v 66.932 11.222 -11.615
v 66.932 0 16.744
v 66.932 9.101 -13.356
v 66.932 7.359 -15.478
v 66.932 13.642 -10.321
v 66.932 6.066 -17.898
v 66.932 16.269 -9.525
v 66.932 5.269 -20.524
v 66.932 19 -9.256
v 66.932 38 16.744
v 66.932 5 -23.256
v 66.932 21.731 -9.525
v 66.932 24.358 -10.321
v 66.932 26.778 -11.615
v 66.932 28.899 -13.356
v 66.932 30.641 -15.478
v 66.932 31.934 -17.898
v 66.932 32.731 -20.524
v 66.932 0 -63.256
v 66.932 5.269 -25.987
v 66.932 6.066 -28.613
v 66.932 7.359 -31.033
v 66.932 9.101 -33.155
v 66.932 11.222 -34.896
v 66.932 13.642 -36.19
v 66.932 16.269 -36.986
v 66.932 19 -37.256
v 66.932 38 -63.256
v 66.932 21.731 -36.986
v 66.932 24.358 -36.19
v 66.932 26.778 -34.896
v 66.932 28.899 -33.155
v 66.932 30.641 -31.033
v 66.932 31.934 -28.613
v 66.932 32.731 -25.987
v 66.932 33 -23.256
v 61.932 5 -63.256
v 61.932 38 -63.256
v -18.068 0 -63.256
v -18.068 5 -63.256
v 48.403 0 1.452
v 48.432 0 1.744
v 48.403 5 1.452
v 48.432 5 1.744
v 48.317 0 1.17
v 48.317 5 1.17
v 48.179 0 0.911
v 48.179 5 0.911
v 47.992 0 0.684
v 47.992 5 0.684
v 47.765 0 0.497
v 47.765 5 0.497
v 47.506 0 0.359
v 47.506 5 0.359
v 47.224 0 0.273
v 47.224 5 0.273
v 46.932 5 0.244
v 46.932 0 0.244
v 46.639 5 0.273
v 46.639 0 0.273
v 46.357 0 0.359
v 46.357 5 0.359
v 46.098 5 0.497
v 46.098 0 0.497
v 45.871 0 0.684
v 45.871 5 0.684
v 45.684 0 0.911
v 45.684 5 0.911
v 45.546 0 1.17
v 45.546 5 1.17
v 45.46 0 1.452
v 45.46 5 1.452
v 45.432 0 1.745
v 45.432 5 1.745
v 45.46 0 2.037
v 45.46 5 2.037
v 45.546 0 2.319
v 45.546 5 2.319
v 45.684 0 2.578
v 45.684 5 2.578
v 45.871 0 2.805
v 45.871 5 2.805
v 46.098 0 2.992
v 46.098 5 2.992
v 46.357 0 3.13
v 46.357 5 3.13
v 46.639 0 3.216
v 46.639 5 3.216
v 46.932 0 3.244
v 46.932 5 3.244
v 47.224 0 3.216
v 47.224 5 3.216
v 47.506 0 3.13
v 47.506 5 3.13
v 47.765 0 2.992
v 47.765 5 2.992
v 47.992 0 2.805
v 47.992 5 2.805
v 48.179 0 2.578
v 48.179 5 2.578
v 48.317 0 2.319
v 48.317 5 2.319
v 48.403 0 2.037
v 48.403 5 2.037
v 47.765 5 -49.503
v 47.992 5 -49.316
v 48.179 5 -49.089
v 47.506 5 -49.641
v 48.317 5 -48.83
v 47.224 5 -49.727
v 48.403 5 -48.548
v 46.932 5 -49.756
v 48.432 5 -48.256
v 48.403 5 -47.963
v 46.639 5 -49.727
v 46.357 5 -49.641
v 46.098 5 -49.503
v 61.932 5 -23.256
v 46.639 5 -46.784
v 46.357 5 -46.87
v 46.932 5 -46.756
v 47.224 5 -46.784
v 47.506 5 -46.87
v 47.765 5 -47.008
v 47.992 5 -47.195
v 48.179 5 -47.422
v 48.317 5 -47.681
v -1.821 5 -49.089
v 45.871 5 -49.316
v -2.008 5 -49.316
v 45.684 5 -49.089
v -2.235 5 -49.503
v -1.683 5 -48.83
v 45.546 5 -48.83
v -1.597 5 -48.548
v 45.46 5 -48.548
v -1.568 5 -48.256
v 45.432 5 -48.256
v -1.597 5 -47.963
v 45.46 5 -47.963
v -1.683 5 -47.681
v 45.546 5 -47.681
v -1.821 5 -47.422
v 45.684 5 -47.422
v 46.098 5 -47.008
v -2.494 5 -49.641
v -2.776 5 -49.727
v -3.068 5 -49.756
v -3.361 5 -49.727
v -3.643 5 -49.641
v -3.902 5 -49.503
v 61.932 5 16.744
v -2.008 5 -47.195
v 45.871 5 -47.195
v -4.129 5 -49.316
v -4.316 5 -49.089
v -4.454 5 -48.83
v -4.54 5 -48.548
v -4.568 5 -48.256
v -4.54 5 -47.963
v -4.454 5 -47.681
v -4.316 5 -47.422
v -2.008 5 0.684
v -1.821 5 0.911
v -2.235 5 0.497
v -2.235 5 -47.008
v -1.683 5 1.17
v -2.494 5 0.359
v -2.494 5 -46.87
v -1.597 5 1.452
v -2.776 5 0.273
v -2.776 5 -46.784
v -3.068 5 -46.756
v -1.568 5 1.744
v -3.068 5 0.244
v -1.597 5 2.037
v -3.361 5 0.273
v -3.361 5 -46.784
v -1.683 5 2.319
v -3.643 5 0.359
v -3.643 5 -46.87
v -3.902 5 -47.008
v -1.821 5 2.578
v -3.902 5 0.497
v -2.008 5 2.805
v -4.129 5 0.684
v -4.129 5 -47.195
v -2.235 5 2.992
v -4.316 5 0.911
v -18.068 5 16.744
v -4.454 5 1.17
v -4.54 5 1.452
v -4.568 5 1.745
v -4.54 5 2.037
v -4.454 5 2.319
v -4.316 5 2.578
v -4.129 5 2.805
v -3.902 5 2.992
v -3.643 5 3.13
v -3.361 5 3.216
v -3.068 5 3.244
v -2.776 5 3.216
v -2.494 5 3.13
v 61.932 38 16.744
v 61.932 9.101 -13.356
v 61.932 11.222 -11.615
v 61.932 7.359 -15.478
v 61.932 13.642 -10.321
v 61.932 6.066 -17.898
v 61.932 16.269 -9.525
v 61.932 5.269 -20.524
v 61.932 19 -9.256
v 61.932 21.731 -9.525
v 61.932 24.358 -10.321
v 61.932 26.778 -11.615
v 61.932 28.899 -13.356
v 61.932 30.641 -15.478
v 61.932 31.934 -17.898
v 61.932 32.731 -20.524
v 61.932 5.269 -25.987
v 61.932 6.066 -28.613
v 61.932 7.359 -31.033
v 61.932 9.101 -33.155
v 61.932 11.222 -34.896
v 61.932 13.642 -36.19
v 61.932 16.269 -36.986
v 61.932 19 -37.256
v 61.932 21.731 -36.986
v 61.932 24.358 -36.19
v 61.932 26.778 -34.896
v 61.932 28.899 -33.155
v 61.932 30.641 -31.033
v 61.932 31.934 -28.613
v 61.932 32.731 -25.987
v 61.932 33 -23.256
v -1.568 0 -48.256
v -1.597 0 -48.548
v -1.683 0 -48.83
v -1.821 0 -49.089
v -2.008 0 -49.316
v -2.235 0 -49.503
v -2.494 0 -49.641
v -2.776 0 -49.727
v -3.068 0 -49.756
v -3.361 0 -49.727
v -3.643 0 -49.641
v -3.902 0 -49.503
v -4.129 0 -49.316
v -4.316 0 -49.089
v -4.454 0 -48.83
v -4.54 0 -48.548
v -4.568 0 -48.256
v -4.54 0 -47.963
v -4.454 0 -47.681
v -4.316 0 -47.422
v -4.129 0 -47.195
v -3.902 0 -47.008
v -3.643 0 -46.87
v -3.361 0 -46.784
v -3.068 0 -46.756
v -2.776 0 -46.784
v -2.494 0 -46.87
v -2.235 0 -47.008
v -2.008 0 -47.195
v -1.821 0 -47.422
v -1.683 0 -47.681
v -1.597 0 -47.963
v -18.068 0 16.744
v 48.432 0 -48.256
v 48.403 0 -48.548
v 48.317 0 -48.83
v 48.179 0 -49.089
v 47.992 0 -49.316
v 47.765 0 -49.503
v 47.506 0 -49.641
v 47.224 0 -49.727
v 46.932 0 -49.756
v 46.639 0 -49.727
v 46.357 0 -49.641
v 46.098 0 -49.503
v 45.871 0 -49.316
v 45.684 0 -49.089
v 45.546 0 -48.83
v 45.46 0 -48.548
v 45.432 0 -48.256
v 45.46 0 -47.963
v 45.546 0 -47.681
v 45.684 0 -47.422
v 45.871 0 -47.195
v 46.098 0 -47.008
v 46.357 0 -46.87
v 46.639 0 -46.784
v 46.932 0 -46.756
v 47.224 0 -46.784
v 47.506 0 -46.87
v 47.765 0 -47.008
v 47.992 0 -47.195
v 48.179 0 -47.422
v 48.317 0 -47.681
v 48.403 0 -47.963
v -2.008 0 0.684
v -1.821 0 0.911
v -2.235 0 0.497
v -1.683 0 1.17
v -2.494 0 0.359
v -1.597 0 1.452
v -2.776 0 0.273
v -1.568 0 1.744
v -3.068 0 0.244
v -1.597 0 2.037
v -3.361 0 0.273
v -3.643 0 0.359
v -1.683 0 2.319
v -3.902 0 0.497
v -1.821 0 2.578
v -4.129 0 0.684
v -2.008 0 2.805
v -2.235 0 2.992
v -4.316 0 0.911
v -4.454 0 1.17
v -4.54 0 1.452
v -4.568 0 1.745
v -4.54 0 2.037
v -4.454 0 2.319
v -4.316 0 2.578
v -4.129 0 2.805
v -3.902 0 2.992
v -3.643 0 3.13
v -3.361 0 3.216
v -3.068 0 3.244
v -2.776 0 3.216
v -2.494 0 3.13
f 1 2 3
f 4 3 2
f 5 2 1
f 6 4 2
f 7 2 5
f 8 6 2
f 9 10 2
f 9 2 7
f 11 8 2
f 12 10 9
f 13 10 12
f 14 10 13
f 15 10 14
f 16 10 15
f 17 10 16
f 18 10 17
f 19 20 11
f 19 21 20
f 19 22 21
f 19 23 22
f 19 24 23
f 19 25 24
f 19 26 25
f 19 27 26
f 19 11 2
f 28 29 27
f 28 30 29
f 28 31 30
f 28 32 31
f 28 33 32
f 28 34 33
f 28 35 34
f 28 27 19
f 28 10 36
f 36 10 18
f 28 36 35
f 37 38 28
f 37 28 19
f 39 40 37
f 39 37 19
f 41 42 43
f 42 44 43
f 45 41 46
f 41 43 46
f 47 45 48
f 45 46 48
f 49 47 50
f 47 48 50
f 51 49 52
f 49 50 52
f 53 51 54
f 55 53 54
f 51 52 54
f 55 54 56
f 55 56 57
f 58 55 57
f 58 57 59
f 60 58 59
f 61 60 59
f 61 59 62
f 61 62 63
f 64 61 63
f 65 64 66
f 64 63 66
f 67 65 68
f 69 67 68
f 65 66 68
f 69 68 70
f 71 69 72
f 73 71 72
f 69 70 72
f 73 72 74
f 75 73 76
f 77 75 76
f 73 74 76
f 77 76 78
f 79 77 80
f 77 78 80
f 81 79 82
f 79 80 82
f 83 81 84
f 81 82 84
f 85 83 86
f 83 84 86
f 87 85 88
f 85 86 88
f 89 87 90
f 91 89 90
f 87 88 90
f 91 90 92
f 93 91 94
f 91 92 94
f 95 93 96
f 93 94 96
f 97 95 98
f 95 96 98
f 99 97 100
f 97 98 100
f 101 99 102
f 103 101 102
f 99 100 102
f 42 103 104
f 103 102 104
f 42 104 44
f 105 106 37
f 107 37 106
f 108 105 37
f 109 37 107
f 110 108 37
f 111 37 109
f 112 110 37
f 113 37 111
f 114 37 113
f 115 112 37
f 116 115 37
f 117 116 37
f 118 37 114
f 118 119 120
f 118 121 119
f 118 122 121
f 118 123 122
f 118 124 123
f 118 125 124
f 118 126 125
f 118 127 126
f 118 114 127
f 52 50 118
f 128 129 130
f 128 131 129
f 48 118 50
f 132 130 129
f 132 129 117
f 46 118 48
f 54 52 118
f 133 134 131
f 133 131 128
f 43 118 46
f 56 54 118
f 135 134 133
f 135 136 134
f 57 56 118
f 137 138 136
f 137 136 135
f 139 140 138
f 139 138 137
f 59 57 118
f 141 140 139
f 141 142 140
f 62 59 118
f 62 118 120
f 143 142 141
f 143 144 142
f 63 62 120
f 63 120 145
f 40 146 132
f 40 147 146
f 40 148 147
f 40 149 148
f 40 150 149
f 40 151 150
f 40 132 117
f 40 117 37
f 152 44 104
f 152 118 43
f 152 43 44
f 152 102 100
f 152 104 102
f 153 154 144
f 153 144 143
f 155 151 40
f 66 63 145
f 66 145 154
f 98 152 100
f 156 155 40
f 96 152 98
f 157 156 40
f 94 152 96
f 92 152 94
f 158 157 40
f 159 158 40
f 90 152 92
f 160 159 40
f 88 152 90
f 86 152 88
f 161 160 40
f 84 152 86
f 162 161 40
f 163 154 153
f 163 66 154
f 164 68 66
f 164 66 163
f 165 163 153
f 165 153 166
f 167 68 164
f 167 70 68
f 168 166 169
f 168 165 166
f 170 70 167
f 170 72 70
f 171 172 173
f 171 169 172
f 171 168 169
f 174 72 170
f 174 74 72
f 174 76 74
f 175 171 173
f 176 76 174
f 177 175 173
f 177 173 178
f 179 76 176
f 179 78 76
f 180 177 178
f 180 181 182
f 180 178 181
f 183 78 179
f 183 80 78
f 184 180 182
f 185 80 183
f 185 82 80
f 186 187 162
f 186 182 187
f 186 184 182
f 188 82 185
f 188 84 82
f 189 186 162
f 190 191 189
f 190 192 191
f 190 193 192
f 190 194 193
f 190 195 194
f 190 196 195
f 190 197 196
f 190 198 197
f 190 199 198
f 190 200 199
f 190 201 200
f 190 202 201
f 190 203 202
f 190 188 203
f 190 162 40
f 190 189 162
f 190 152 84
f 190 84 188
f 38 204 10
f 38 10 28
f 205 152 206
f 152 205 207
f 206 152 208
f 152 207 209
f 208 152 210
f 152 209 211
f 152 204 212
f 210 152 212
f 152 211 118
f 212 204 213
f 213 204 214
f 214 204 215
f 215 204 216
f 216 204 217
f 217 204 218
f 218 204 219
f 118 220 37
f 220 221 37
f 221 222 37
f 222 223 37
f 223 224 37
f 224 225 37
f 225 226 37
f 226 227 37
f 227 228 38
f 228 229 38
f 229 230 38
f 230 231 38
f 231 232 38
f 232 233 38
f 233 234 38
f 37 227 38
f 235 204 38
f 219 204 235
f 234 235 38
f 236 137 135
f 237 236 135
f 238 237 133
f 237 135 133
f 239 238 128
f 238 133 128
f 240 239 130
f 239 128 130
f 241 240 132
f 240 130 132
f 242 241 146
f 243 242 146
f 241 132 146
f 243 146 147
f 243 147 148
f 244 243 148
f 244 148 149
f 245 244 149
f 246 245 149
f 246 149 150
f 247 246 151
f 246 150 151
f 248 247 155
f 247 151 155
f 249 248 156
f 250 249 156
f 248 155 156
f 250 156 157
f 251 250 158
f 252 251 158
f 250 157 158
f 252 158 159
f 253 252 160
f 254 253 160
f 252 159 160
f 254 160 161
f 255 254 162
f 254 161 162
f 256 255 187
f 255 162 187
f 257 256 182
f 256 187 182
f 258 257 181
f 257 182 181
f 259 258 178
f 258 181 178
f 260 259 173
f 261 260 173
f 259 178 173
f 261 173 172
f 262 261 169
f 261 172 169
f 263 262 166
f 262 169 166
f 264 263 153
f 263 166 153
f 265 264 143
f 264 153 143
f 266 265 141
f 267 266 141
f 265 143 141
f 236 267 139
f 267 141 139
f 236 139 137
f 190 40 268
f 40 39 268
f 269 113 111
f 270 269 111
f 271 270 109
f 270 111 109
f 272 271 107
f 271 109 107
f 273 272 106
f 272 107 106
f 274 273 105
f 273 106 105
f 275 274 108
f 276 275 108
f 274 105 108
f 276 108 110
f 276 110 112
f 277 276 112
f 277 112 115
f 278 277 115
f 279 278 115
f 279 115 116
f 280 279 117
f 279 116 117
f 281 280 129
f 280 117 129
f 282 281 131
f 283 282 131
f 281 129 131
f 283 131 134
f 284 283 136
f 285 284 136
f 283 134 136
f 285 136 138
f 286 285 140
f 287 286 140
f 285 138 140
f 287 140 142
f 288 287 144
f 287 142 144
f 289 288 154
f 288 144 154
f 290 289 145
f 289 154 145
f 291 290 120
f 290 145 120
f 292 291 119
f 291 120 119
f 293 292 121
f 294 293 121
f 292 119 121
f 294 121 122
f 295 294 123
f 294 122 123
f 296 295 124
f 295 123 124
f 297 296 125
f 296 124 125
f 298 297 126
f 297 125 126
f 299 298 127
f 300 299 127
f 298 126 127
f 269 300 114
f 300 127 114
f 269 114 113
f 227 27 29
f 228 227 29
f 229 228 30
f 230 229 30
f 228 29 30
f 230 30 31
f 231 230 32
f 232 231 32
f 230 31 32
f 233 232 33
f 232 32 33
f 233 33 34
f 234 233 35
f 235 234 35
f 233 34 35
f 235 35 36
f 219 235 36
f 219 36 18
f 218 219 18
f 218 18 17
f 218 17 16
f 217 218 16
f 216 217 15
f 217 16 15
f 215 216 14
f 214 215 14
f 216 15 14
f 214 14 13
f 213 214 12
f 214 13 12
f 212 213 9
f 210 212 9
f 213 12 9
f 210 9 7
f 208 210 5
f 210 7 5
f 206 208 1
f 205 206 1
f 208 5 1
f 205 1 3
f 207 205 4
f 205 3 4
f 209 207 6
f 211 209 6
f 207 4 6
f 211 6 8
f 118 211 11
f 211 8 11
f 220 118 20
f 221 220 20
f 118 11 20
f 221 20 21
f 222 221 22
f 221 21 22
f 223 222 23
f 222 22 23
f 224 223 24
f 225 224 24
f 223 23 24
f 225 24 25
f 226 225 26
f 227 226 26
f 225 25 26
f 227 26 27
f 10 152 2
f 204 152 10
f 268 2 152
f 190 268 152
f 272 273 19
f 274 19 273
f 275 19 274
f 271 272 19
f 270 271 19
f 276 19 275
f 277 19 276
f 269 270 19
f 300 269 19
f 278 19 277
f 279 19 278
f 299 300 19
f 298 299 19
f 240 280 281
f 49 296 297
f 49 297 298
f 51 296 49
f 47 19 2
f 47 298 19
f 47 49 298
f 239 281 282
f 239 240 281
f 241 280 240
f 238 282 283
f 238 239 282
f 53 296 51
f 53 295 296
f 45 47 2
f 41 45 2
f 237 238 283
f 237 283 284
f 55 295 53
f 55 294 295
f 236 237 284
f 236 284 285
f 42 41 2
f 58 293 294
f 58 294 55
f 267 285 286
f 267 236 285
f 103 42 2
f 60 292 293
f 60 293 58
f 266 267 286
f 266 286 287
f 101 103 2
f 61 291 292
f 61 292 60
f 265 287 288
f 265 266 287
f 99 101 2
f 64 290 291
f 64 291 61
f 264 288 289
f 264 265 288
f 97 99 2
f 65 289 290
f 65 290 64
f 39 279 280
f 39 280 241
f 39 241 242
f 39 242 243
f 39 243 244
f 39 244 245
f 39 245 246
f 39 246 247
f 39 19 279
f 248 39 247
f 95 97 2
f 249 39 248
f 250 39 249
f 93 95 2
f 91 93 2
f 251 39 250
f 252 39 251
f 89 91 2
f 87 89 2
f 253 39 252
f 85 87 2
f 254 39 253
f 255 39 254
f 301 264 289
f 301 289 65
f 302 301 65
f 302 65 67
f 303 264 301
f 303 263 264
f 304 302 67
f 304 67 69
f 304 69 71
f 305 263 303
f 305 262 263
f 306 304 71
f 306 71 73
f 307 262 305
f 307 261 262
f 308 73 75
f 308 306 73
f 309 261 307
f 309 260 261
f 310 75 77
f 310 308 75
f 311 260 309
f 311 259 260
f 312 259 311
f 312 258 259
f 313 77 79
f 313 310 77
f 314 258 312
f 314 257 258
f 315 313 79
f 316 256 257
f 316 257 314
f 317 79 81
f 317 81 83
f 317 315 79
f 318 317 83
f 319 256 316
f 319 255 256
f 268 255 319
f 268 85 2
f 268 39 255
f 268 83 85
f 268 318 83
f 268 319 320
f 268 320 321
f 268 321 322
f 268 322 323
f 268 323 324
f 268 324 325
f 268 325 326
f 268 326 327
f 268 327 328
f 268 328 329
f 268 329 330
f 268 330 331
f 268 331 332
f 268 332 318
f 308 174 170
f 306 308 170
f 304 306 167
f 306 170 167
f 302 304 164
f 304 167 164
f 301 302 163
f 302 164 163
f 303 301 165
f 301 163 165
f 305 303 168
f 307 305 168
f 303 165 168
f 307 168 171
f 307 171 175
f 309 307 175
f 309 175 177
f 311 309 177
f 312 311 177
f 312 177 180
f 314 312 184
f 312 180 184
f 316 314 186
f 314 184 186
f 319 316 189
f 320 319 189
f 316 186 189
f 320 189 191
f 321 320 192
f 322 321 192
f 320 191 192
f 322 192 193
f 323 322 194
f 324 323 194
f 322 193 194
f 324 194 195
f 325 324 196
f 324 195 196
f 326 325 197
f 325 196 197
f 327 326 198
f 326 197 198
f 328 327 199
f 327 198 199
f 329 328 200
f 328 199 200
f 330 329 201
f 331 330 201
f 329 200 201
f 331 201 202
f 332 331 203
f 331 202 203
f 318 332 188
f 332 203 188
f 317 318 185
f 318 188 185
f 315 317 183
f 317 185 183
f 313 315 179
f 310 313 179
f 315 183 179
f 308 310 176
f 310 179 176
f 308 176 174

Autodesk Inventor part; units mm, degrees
ref_plane "YZ Plane" through (0, 0, 0) normal (1, 0, 0) x (0, 1, 0)
ref_plane "XZ Plane" through (0, 0, 0) normal (0, 1, 0) x (-1, 0, 0)
ref_plane "XY Plane" through (0, 0, 0) normal (0, 0, 1) x (1, 0, 0)
sketch "草图1" plane through (0, 0, 0) normal (0, 1, 0) x (-1, 0, 0)
  line L0 (18.0685, 16.7445) -> (-61.9315, 16.7445)
  line L1 (-61.9315, 16.7445) -> (-61.9315, -63.2555)
  line L2 (-61.9315, -63.2555) -> (18.0685, -63.2555)
  line L3 (18.0685, -63.2555) -> (18.0685, 16.7445)
  point P0 (0, 0)
  dimension "d0" = 80
  dimension "d1" = 80
extrude "拉伸1" add sketch "草图1" along normal blind 5
sketch "草图2" plane through (0, 5, 0) normal (0, 1, 0) x (1, 0, 0)
  circle A0 centre (46.9315, -1.7445) radius 1.5
  line L0 (61.9315, -16.7445) -> (61.9315, 63.2555) projected
  line L1 (-18.0685, -16.7445) -> (61.9315, -16.7445) projected
  circle A1 centre (-3.0685, -1.7445) radius 1.5
  circle A2 centre (-3.0685, 48.2555) radius 1.5
  circle A3 centre (46.9315, 48.2555) radius 1.5
  point P0 (0, 0)
  dimension "d4" = 15
  dimension "d5" = 15
  dimension "d6" = 3
  dimension "d9" = 50
  dimension "d16" = 50
  dimension "d23" = 50
extrude "拉伸2" cut sketch "草图2" against normal blind 5
sketch "草图3" plane through (61.9315, 0, 16.7445) normal (1, 0, 0) x (0, 0, -1)
  line L0 (0, 38) -> (80, 38)
  line L1 (80, 38) -> (80, 0)
  line L2 (80, 0) -> (0, 0)
  line L3 (0, 0) -> (0, 38)
  line L4 (0, 0) -> (80, 0) projected
  line L5 (0, 0) -> (0, 5) projected
  point P0 (16.7445, 0)
  point P1 (0, 2.5)
  point P2 (0, 19)
  dimension "d30" = 38
  dimension "d31" = 80
  dimension "d32" = 0
  dimension "d33" = 0
extrude "拉伸3" add sketch "草图3" along normal blind 5
sketch "草图4" plane through (66.9315, 0, 16.7445) normal (1, 0, 0) x (0, 0, -1)
  circle A0 centre (40, 19) radius 14
  line L0 (0, 38) -> (0, 0) projected
  line L1 (0, 0) -> (80, 0) projected
  point P0 (16.7445, 0)
  point P1 (40, 0)
  dimension "d36" = 28
  dimension "d37" = 40
  dimension "d38" = 19
extrude "拉伸4" cut sketch "草图4" against normal blind 5
properties part number "电机底座"
